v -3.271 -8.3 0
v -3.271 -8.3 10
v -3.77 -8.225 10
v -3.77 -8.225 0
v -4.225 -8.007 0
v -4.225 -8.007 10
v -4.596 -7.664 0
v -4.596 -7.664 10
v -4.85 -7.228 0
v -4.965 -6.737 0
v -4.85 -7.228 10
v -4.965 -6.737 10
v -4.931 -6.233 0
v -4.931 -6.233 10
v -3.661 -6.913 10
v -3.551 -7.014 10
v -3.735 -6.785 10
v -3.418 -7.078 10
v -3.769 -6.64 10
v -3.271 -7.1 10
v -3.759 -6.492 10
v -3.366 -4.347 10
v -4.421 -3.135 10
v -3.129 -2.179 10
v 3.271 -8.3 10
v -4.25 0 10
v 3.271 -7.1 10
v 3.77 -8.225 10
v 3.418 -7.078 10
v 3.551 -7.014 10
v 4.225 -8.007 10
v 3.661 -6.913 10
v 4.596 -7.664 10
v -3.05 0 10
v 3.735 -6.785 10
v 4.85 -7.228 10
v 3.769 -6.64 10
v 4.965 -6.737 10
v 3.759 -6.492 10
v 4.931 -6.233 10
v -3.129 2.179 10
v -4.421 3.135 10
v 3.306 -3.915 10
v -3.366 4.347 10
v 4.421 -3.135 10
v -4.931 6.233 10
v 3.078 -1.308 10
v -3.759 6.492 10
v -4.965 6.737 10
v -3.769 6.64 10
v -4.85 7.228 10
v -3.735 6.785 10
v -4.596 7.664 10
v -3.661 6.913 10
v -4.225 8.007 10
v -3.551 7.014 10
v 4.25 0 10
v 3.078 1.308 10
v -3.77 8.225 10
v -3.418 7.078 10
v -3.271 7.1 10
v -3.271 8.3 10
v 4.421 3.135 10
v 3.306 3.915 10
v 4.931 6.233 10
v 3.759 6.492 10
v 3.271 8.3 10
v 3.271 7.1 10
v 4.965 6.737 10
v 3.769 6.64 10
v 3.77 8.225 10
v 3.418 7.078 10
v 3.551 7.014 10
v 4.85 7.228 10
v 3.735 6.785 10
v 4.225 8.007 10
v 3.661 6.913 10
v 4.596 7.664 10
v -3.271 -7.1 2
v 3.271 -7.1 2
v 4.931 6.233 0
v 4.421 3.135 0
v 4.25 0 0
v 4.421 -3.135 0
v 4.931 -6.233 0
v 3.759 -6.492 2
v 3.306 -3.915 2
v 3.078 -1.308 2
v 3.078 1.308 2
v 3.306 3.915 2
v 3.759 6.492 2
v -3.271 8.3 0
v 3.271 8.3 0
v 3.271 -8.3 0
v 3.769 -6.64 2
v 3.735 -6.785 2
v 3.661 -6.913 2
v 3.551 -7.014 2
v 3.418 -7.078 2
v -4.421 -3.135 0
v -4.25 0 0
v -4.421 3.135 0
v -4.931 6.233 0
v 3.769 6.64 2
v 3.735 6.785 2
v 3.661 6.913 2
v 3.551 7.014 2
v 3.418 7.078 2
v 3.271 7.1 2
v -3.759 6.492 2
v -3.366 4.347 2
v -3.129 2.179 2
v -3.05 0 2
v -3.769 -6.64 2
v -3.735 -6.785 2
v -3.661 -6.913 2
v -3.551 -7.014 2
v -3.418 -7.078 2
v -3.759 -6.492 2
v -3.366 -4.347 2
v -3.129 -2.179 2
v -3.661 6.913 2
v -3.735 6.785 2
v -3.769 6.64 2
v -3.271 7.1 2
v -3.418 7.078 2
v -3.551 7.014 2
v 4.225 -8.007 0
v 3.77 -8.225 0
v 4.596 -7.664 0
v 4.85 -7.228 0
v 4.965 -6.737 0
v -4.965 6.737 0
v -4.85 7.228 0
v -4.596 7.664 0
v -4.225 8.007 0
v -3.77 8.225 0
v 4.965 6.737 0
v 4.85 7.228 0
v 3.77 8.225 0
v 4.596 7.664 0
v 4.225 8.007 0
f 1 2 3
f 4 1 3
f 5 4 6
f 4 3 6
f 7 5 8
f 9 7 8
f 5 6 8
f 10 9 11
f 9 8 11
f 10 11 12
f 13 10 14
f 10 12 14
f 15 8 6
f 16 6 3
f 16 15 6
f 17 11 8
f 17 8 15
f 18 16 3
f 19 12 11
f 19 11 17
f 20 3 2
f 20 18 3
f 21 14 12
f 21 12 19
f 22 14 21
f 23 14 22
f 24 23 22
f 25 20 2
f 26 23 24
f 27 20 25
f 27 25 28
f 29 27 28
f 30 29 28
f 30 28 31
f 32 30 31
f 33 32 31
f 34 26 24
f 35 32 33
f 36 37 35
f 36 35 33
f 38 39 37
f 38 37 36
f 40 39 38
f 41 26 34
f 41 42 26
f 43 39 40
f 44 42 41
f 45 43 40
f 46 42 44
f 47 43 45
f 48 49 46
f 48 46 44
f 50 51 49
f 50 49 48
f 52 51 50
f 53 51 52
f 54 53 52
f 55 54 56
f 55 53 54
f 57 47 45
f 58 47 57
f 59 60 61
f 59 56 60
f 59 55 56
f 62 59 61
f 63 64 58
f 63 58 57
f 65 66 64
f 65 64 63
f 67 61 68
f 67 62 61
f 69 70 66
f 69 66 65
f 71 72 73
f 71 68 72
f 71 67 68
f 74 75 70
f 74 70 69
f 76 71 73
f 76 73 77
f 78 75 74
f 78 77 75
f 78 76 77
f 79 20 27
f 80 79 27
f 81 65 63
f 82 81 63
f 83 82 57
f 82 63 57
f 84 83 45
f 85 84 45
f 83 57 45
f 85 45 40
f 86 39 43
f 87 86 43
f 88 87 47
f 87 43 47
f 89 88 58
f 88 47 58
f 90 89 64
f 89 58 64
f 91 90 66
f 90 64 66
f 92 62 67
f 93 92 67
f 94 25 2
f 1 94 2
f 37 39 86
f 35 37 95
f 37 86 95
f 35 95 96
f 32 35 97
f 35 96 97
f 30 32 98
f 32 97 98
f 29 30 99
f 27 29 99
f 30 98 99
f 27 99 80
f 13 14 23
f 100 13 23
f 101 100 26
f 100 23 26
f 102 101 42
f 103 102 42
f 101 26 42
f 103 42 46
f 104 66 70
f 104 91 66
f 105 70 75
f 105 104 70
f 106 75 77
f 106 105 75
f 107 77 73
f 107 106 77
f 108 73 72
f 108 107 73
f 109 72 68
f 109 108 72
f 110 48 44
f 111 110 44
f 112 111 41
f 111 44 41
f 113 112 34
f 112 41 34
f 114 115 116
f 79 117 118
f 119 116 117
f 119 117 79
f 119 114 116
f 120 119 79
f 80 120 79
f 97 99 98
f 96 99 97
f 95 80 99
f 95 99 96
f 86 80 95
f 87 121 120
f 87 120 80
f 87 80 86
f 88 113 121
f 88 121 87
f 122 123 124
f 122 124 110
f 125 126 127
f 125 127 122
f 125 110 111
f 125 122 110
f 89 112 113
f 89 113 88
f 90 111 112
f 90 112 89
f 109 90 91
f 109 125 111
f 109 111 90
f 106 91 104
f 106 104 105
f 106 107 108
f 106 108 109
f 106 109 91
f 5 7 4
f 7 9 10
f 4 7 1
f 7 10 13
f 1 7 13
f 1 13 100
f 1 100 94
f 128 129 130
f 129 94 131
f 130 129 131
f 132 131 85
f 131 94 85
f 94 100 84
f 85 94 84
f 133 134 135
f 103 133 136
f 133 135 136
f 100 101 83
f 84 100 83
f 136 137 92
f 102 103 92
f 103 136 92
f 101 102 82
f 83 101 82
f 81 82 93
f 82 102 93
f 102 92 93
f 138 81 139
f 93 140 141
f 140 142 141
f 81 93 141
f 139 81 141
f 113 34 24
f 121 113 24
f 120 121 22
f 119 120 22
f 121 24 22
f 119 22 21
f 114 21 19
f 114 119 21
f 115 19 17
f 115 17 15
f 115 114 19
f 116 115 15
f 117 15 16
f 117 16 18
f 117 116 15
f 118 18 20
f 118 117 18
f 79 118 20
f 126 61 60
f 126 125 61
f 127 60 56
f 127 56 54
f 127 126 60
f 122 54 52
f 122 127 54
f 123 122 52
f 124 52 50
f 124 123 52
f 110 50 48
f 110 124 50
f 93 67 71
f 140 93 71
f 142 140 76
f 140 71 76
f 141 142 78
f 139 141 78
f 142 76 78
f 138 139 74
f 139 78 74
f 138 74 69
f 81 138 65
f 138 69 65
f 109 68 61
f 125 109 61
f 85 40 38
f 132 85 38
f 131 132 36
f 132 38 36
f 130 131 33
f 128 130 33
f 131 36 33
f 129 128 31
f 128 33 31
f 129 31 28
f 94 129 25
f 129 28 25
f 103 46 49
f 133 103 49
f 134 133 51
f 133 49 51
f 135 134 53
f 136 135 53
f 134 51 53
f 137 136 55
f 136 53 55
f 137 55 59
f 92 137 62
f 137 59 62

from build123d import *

# Parameters (mm, degrees)
F0_W     = 14
F0_H     = 20
F1_DEPTH = 10
F3_DEPTH = 8
F4_R     = 0.5
F5_W     = 14
F5_H     = 20
F6_DEPTH = 10


with BuildPart() as f1:
    # F0 (on Top) → F1 (new body)
    with BuildSketch(Plane.XY):
        Rectangle(F0_W, F0_H)
    extrude(amount=F1_DEPTH)

    # F2 (on face) → F3 (cut)
    with BuildSketch(Plane.XY.offset(10)):
        with BuildLine():
            ThreePointArc((3.9, -7.1), (3.05, 0), (3.9, 7.1))
            Line((3.9, 7.1), (-3.9, 7.1))
            ThreePointArc((-3.9, 7.1), (-3.2632560046, 3.5753496333), (-3.05, 0))
            ThreePointArc((-3.05, 0), (-3.2632560046, -3.5753496333), (-3.9, -7.1))
            Line((-3.9, -7.1), (3.9, -7.1))
        make_face()
    extrude(amount=-F3_DEPTH, mode=Mode.SUBTRACT)

    # F4
    f4_edges = [f1.edges().sort_by_distance(p)[0] for p in [
        (-3.9, 7.1, 6),
        (-3.9, -7.1, 6),
        (3.9, 7.1, 6),
        (3.9, -7.1, 6),
    ]]
    fillet(f4_edges, radius=F4_R)

    # F5 (on face) → F6 (cut, through all)
    with BuildSketch(Plane.XY.offset(10)):
        Rectangle(F5_W, F5_H)
        with BuildLine():
            ThreePointArc((4.9307012466, -6.2330688212), (4.5962509216, -7.6644756916), (3.2707730825, -8.3))
            Line((3.2707730825, -8.3), (-3.2707730825, -8.3))
            ThreePointArc((-3.2707730825, -8.3), (-4.5962509216, -7.6644756916), (-4.9307012466, -6.2330688212))
            ThreePointArc((-4.9307012466, -6.2330688212), (-4.25, 0), (-4.9307012466, 6.2330688212))
            ThreePointArc((-4.9307012466, 6.2330688212), (-4.5962509216, 7.6644756916), (-3.2707730825, 8.3))
            Line((-3.2707730825, 8.3), (3.2707730825, 8.3))
            ThreePointArc((3.2707730825, 8.3), (4.5962509216, 7.6644756916), (4.9307012466, 6.2330688212))
            ThreePointArc((4.9307012466, 6.2330688212), (4.25, 0), (4.9307012466, -6.2330688212))
        make_face(mode=Mode.SUBTRACT)
    extrude(amount=-F6_DEPTH, mode=Mode.SUBTRACT)


solid = f1.part
